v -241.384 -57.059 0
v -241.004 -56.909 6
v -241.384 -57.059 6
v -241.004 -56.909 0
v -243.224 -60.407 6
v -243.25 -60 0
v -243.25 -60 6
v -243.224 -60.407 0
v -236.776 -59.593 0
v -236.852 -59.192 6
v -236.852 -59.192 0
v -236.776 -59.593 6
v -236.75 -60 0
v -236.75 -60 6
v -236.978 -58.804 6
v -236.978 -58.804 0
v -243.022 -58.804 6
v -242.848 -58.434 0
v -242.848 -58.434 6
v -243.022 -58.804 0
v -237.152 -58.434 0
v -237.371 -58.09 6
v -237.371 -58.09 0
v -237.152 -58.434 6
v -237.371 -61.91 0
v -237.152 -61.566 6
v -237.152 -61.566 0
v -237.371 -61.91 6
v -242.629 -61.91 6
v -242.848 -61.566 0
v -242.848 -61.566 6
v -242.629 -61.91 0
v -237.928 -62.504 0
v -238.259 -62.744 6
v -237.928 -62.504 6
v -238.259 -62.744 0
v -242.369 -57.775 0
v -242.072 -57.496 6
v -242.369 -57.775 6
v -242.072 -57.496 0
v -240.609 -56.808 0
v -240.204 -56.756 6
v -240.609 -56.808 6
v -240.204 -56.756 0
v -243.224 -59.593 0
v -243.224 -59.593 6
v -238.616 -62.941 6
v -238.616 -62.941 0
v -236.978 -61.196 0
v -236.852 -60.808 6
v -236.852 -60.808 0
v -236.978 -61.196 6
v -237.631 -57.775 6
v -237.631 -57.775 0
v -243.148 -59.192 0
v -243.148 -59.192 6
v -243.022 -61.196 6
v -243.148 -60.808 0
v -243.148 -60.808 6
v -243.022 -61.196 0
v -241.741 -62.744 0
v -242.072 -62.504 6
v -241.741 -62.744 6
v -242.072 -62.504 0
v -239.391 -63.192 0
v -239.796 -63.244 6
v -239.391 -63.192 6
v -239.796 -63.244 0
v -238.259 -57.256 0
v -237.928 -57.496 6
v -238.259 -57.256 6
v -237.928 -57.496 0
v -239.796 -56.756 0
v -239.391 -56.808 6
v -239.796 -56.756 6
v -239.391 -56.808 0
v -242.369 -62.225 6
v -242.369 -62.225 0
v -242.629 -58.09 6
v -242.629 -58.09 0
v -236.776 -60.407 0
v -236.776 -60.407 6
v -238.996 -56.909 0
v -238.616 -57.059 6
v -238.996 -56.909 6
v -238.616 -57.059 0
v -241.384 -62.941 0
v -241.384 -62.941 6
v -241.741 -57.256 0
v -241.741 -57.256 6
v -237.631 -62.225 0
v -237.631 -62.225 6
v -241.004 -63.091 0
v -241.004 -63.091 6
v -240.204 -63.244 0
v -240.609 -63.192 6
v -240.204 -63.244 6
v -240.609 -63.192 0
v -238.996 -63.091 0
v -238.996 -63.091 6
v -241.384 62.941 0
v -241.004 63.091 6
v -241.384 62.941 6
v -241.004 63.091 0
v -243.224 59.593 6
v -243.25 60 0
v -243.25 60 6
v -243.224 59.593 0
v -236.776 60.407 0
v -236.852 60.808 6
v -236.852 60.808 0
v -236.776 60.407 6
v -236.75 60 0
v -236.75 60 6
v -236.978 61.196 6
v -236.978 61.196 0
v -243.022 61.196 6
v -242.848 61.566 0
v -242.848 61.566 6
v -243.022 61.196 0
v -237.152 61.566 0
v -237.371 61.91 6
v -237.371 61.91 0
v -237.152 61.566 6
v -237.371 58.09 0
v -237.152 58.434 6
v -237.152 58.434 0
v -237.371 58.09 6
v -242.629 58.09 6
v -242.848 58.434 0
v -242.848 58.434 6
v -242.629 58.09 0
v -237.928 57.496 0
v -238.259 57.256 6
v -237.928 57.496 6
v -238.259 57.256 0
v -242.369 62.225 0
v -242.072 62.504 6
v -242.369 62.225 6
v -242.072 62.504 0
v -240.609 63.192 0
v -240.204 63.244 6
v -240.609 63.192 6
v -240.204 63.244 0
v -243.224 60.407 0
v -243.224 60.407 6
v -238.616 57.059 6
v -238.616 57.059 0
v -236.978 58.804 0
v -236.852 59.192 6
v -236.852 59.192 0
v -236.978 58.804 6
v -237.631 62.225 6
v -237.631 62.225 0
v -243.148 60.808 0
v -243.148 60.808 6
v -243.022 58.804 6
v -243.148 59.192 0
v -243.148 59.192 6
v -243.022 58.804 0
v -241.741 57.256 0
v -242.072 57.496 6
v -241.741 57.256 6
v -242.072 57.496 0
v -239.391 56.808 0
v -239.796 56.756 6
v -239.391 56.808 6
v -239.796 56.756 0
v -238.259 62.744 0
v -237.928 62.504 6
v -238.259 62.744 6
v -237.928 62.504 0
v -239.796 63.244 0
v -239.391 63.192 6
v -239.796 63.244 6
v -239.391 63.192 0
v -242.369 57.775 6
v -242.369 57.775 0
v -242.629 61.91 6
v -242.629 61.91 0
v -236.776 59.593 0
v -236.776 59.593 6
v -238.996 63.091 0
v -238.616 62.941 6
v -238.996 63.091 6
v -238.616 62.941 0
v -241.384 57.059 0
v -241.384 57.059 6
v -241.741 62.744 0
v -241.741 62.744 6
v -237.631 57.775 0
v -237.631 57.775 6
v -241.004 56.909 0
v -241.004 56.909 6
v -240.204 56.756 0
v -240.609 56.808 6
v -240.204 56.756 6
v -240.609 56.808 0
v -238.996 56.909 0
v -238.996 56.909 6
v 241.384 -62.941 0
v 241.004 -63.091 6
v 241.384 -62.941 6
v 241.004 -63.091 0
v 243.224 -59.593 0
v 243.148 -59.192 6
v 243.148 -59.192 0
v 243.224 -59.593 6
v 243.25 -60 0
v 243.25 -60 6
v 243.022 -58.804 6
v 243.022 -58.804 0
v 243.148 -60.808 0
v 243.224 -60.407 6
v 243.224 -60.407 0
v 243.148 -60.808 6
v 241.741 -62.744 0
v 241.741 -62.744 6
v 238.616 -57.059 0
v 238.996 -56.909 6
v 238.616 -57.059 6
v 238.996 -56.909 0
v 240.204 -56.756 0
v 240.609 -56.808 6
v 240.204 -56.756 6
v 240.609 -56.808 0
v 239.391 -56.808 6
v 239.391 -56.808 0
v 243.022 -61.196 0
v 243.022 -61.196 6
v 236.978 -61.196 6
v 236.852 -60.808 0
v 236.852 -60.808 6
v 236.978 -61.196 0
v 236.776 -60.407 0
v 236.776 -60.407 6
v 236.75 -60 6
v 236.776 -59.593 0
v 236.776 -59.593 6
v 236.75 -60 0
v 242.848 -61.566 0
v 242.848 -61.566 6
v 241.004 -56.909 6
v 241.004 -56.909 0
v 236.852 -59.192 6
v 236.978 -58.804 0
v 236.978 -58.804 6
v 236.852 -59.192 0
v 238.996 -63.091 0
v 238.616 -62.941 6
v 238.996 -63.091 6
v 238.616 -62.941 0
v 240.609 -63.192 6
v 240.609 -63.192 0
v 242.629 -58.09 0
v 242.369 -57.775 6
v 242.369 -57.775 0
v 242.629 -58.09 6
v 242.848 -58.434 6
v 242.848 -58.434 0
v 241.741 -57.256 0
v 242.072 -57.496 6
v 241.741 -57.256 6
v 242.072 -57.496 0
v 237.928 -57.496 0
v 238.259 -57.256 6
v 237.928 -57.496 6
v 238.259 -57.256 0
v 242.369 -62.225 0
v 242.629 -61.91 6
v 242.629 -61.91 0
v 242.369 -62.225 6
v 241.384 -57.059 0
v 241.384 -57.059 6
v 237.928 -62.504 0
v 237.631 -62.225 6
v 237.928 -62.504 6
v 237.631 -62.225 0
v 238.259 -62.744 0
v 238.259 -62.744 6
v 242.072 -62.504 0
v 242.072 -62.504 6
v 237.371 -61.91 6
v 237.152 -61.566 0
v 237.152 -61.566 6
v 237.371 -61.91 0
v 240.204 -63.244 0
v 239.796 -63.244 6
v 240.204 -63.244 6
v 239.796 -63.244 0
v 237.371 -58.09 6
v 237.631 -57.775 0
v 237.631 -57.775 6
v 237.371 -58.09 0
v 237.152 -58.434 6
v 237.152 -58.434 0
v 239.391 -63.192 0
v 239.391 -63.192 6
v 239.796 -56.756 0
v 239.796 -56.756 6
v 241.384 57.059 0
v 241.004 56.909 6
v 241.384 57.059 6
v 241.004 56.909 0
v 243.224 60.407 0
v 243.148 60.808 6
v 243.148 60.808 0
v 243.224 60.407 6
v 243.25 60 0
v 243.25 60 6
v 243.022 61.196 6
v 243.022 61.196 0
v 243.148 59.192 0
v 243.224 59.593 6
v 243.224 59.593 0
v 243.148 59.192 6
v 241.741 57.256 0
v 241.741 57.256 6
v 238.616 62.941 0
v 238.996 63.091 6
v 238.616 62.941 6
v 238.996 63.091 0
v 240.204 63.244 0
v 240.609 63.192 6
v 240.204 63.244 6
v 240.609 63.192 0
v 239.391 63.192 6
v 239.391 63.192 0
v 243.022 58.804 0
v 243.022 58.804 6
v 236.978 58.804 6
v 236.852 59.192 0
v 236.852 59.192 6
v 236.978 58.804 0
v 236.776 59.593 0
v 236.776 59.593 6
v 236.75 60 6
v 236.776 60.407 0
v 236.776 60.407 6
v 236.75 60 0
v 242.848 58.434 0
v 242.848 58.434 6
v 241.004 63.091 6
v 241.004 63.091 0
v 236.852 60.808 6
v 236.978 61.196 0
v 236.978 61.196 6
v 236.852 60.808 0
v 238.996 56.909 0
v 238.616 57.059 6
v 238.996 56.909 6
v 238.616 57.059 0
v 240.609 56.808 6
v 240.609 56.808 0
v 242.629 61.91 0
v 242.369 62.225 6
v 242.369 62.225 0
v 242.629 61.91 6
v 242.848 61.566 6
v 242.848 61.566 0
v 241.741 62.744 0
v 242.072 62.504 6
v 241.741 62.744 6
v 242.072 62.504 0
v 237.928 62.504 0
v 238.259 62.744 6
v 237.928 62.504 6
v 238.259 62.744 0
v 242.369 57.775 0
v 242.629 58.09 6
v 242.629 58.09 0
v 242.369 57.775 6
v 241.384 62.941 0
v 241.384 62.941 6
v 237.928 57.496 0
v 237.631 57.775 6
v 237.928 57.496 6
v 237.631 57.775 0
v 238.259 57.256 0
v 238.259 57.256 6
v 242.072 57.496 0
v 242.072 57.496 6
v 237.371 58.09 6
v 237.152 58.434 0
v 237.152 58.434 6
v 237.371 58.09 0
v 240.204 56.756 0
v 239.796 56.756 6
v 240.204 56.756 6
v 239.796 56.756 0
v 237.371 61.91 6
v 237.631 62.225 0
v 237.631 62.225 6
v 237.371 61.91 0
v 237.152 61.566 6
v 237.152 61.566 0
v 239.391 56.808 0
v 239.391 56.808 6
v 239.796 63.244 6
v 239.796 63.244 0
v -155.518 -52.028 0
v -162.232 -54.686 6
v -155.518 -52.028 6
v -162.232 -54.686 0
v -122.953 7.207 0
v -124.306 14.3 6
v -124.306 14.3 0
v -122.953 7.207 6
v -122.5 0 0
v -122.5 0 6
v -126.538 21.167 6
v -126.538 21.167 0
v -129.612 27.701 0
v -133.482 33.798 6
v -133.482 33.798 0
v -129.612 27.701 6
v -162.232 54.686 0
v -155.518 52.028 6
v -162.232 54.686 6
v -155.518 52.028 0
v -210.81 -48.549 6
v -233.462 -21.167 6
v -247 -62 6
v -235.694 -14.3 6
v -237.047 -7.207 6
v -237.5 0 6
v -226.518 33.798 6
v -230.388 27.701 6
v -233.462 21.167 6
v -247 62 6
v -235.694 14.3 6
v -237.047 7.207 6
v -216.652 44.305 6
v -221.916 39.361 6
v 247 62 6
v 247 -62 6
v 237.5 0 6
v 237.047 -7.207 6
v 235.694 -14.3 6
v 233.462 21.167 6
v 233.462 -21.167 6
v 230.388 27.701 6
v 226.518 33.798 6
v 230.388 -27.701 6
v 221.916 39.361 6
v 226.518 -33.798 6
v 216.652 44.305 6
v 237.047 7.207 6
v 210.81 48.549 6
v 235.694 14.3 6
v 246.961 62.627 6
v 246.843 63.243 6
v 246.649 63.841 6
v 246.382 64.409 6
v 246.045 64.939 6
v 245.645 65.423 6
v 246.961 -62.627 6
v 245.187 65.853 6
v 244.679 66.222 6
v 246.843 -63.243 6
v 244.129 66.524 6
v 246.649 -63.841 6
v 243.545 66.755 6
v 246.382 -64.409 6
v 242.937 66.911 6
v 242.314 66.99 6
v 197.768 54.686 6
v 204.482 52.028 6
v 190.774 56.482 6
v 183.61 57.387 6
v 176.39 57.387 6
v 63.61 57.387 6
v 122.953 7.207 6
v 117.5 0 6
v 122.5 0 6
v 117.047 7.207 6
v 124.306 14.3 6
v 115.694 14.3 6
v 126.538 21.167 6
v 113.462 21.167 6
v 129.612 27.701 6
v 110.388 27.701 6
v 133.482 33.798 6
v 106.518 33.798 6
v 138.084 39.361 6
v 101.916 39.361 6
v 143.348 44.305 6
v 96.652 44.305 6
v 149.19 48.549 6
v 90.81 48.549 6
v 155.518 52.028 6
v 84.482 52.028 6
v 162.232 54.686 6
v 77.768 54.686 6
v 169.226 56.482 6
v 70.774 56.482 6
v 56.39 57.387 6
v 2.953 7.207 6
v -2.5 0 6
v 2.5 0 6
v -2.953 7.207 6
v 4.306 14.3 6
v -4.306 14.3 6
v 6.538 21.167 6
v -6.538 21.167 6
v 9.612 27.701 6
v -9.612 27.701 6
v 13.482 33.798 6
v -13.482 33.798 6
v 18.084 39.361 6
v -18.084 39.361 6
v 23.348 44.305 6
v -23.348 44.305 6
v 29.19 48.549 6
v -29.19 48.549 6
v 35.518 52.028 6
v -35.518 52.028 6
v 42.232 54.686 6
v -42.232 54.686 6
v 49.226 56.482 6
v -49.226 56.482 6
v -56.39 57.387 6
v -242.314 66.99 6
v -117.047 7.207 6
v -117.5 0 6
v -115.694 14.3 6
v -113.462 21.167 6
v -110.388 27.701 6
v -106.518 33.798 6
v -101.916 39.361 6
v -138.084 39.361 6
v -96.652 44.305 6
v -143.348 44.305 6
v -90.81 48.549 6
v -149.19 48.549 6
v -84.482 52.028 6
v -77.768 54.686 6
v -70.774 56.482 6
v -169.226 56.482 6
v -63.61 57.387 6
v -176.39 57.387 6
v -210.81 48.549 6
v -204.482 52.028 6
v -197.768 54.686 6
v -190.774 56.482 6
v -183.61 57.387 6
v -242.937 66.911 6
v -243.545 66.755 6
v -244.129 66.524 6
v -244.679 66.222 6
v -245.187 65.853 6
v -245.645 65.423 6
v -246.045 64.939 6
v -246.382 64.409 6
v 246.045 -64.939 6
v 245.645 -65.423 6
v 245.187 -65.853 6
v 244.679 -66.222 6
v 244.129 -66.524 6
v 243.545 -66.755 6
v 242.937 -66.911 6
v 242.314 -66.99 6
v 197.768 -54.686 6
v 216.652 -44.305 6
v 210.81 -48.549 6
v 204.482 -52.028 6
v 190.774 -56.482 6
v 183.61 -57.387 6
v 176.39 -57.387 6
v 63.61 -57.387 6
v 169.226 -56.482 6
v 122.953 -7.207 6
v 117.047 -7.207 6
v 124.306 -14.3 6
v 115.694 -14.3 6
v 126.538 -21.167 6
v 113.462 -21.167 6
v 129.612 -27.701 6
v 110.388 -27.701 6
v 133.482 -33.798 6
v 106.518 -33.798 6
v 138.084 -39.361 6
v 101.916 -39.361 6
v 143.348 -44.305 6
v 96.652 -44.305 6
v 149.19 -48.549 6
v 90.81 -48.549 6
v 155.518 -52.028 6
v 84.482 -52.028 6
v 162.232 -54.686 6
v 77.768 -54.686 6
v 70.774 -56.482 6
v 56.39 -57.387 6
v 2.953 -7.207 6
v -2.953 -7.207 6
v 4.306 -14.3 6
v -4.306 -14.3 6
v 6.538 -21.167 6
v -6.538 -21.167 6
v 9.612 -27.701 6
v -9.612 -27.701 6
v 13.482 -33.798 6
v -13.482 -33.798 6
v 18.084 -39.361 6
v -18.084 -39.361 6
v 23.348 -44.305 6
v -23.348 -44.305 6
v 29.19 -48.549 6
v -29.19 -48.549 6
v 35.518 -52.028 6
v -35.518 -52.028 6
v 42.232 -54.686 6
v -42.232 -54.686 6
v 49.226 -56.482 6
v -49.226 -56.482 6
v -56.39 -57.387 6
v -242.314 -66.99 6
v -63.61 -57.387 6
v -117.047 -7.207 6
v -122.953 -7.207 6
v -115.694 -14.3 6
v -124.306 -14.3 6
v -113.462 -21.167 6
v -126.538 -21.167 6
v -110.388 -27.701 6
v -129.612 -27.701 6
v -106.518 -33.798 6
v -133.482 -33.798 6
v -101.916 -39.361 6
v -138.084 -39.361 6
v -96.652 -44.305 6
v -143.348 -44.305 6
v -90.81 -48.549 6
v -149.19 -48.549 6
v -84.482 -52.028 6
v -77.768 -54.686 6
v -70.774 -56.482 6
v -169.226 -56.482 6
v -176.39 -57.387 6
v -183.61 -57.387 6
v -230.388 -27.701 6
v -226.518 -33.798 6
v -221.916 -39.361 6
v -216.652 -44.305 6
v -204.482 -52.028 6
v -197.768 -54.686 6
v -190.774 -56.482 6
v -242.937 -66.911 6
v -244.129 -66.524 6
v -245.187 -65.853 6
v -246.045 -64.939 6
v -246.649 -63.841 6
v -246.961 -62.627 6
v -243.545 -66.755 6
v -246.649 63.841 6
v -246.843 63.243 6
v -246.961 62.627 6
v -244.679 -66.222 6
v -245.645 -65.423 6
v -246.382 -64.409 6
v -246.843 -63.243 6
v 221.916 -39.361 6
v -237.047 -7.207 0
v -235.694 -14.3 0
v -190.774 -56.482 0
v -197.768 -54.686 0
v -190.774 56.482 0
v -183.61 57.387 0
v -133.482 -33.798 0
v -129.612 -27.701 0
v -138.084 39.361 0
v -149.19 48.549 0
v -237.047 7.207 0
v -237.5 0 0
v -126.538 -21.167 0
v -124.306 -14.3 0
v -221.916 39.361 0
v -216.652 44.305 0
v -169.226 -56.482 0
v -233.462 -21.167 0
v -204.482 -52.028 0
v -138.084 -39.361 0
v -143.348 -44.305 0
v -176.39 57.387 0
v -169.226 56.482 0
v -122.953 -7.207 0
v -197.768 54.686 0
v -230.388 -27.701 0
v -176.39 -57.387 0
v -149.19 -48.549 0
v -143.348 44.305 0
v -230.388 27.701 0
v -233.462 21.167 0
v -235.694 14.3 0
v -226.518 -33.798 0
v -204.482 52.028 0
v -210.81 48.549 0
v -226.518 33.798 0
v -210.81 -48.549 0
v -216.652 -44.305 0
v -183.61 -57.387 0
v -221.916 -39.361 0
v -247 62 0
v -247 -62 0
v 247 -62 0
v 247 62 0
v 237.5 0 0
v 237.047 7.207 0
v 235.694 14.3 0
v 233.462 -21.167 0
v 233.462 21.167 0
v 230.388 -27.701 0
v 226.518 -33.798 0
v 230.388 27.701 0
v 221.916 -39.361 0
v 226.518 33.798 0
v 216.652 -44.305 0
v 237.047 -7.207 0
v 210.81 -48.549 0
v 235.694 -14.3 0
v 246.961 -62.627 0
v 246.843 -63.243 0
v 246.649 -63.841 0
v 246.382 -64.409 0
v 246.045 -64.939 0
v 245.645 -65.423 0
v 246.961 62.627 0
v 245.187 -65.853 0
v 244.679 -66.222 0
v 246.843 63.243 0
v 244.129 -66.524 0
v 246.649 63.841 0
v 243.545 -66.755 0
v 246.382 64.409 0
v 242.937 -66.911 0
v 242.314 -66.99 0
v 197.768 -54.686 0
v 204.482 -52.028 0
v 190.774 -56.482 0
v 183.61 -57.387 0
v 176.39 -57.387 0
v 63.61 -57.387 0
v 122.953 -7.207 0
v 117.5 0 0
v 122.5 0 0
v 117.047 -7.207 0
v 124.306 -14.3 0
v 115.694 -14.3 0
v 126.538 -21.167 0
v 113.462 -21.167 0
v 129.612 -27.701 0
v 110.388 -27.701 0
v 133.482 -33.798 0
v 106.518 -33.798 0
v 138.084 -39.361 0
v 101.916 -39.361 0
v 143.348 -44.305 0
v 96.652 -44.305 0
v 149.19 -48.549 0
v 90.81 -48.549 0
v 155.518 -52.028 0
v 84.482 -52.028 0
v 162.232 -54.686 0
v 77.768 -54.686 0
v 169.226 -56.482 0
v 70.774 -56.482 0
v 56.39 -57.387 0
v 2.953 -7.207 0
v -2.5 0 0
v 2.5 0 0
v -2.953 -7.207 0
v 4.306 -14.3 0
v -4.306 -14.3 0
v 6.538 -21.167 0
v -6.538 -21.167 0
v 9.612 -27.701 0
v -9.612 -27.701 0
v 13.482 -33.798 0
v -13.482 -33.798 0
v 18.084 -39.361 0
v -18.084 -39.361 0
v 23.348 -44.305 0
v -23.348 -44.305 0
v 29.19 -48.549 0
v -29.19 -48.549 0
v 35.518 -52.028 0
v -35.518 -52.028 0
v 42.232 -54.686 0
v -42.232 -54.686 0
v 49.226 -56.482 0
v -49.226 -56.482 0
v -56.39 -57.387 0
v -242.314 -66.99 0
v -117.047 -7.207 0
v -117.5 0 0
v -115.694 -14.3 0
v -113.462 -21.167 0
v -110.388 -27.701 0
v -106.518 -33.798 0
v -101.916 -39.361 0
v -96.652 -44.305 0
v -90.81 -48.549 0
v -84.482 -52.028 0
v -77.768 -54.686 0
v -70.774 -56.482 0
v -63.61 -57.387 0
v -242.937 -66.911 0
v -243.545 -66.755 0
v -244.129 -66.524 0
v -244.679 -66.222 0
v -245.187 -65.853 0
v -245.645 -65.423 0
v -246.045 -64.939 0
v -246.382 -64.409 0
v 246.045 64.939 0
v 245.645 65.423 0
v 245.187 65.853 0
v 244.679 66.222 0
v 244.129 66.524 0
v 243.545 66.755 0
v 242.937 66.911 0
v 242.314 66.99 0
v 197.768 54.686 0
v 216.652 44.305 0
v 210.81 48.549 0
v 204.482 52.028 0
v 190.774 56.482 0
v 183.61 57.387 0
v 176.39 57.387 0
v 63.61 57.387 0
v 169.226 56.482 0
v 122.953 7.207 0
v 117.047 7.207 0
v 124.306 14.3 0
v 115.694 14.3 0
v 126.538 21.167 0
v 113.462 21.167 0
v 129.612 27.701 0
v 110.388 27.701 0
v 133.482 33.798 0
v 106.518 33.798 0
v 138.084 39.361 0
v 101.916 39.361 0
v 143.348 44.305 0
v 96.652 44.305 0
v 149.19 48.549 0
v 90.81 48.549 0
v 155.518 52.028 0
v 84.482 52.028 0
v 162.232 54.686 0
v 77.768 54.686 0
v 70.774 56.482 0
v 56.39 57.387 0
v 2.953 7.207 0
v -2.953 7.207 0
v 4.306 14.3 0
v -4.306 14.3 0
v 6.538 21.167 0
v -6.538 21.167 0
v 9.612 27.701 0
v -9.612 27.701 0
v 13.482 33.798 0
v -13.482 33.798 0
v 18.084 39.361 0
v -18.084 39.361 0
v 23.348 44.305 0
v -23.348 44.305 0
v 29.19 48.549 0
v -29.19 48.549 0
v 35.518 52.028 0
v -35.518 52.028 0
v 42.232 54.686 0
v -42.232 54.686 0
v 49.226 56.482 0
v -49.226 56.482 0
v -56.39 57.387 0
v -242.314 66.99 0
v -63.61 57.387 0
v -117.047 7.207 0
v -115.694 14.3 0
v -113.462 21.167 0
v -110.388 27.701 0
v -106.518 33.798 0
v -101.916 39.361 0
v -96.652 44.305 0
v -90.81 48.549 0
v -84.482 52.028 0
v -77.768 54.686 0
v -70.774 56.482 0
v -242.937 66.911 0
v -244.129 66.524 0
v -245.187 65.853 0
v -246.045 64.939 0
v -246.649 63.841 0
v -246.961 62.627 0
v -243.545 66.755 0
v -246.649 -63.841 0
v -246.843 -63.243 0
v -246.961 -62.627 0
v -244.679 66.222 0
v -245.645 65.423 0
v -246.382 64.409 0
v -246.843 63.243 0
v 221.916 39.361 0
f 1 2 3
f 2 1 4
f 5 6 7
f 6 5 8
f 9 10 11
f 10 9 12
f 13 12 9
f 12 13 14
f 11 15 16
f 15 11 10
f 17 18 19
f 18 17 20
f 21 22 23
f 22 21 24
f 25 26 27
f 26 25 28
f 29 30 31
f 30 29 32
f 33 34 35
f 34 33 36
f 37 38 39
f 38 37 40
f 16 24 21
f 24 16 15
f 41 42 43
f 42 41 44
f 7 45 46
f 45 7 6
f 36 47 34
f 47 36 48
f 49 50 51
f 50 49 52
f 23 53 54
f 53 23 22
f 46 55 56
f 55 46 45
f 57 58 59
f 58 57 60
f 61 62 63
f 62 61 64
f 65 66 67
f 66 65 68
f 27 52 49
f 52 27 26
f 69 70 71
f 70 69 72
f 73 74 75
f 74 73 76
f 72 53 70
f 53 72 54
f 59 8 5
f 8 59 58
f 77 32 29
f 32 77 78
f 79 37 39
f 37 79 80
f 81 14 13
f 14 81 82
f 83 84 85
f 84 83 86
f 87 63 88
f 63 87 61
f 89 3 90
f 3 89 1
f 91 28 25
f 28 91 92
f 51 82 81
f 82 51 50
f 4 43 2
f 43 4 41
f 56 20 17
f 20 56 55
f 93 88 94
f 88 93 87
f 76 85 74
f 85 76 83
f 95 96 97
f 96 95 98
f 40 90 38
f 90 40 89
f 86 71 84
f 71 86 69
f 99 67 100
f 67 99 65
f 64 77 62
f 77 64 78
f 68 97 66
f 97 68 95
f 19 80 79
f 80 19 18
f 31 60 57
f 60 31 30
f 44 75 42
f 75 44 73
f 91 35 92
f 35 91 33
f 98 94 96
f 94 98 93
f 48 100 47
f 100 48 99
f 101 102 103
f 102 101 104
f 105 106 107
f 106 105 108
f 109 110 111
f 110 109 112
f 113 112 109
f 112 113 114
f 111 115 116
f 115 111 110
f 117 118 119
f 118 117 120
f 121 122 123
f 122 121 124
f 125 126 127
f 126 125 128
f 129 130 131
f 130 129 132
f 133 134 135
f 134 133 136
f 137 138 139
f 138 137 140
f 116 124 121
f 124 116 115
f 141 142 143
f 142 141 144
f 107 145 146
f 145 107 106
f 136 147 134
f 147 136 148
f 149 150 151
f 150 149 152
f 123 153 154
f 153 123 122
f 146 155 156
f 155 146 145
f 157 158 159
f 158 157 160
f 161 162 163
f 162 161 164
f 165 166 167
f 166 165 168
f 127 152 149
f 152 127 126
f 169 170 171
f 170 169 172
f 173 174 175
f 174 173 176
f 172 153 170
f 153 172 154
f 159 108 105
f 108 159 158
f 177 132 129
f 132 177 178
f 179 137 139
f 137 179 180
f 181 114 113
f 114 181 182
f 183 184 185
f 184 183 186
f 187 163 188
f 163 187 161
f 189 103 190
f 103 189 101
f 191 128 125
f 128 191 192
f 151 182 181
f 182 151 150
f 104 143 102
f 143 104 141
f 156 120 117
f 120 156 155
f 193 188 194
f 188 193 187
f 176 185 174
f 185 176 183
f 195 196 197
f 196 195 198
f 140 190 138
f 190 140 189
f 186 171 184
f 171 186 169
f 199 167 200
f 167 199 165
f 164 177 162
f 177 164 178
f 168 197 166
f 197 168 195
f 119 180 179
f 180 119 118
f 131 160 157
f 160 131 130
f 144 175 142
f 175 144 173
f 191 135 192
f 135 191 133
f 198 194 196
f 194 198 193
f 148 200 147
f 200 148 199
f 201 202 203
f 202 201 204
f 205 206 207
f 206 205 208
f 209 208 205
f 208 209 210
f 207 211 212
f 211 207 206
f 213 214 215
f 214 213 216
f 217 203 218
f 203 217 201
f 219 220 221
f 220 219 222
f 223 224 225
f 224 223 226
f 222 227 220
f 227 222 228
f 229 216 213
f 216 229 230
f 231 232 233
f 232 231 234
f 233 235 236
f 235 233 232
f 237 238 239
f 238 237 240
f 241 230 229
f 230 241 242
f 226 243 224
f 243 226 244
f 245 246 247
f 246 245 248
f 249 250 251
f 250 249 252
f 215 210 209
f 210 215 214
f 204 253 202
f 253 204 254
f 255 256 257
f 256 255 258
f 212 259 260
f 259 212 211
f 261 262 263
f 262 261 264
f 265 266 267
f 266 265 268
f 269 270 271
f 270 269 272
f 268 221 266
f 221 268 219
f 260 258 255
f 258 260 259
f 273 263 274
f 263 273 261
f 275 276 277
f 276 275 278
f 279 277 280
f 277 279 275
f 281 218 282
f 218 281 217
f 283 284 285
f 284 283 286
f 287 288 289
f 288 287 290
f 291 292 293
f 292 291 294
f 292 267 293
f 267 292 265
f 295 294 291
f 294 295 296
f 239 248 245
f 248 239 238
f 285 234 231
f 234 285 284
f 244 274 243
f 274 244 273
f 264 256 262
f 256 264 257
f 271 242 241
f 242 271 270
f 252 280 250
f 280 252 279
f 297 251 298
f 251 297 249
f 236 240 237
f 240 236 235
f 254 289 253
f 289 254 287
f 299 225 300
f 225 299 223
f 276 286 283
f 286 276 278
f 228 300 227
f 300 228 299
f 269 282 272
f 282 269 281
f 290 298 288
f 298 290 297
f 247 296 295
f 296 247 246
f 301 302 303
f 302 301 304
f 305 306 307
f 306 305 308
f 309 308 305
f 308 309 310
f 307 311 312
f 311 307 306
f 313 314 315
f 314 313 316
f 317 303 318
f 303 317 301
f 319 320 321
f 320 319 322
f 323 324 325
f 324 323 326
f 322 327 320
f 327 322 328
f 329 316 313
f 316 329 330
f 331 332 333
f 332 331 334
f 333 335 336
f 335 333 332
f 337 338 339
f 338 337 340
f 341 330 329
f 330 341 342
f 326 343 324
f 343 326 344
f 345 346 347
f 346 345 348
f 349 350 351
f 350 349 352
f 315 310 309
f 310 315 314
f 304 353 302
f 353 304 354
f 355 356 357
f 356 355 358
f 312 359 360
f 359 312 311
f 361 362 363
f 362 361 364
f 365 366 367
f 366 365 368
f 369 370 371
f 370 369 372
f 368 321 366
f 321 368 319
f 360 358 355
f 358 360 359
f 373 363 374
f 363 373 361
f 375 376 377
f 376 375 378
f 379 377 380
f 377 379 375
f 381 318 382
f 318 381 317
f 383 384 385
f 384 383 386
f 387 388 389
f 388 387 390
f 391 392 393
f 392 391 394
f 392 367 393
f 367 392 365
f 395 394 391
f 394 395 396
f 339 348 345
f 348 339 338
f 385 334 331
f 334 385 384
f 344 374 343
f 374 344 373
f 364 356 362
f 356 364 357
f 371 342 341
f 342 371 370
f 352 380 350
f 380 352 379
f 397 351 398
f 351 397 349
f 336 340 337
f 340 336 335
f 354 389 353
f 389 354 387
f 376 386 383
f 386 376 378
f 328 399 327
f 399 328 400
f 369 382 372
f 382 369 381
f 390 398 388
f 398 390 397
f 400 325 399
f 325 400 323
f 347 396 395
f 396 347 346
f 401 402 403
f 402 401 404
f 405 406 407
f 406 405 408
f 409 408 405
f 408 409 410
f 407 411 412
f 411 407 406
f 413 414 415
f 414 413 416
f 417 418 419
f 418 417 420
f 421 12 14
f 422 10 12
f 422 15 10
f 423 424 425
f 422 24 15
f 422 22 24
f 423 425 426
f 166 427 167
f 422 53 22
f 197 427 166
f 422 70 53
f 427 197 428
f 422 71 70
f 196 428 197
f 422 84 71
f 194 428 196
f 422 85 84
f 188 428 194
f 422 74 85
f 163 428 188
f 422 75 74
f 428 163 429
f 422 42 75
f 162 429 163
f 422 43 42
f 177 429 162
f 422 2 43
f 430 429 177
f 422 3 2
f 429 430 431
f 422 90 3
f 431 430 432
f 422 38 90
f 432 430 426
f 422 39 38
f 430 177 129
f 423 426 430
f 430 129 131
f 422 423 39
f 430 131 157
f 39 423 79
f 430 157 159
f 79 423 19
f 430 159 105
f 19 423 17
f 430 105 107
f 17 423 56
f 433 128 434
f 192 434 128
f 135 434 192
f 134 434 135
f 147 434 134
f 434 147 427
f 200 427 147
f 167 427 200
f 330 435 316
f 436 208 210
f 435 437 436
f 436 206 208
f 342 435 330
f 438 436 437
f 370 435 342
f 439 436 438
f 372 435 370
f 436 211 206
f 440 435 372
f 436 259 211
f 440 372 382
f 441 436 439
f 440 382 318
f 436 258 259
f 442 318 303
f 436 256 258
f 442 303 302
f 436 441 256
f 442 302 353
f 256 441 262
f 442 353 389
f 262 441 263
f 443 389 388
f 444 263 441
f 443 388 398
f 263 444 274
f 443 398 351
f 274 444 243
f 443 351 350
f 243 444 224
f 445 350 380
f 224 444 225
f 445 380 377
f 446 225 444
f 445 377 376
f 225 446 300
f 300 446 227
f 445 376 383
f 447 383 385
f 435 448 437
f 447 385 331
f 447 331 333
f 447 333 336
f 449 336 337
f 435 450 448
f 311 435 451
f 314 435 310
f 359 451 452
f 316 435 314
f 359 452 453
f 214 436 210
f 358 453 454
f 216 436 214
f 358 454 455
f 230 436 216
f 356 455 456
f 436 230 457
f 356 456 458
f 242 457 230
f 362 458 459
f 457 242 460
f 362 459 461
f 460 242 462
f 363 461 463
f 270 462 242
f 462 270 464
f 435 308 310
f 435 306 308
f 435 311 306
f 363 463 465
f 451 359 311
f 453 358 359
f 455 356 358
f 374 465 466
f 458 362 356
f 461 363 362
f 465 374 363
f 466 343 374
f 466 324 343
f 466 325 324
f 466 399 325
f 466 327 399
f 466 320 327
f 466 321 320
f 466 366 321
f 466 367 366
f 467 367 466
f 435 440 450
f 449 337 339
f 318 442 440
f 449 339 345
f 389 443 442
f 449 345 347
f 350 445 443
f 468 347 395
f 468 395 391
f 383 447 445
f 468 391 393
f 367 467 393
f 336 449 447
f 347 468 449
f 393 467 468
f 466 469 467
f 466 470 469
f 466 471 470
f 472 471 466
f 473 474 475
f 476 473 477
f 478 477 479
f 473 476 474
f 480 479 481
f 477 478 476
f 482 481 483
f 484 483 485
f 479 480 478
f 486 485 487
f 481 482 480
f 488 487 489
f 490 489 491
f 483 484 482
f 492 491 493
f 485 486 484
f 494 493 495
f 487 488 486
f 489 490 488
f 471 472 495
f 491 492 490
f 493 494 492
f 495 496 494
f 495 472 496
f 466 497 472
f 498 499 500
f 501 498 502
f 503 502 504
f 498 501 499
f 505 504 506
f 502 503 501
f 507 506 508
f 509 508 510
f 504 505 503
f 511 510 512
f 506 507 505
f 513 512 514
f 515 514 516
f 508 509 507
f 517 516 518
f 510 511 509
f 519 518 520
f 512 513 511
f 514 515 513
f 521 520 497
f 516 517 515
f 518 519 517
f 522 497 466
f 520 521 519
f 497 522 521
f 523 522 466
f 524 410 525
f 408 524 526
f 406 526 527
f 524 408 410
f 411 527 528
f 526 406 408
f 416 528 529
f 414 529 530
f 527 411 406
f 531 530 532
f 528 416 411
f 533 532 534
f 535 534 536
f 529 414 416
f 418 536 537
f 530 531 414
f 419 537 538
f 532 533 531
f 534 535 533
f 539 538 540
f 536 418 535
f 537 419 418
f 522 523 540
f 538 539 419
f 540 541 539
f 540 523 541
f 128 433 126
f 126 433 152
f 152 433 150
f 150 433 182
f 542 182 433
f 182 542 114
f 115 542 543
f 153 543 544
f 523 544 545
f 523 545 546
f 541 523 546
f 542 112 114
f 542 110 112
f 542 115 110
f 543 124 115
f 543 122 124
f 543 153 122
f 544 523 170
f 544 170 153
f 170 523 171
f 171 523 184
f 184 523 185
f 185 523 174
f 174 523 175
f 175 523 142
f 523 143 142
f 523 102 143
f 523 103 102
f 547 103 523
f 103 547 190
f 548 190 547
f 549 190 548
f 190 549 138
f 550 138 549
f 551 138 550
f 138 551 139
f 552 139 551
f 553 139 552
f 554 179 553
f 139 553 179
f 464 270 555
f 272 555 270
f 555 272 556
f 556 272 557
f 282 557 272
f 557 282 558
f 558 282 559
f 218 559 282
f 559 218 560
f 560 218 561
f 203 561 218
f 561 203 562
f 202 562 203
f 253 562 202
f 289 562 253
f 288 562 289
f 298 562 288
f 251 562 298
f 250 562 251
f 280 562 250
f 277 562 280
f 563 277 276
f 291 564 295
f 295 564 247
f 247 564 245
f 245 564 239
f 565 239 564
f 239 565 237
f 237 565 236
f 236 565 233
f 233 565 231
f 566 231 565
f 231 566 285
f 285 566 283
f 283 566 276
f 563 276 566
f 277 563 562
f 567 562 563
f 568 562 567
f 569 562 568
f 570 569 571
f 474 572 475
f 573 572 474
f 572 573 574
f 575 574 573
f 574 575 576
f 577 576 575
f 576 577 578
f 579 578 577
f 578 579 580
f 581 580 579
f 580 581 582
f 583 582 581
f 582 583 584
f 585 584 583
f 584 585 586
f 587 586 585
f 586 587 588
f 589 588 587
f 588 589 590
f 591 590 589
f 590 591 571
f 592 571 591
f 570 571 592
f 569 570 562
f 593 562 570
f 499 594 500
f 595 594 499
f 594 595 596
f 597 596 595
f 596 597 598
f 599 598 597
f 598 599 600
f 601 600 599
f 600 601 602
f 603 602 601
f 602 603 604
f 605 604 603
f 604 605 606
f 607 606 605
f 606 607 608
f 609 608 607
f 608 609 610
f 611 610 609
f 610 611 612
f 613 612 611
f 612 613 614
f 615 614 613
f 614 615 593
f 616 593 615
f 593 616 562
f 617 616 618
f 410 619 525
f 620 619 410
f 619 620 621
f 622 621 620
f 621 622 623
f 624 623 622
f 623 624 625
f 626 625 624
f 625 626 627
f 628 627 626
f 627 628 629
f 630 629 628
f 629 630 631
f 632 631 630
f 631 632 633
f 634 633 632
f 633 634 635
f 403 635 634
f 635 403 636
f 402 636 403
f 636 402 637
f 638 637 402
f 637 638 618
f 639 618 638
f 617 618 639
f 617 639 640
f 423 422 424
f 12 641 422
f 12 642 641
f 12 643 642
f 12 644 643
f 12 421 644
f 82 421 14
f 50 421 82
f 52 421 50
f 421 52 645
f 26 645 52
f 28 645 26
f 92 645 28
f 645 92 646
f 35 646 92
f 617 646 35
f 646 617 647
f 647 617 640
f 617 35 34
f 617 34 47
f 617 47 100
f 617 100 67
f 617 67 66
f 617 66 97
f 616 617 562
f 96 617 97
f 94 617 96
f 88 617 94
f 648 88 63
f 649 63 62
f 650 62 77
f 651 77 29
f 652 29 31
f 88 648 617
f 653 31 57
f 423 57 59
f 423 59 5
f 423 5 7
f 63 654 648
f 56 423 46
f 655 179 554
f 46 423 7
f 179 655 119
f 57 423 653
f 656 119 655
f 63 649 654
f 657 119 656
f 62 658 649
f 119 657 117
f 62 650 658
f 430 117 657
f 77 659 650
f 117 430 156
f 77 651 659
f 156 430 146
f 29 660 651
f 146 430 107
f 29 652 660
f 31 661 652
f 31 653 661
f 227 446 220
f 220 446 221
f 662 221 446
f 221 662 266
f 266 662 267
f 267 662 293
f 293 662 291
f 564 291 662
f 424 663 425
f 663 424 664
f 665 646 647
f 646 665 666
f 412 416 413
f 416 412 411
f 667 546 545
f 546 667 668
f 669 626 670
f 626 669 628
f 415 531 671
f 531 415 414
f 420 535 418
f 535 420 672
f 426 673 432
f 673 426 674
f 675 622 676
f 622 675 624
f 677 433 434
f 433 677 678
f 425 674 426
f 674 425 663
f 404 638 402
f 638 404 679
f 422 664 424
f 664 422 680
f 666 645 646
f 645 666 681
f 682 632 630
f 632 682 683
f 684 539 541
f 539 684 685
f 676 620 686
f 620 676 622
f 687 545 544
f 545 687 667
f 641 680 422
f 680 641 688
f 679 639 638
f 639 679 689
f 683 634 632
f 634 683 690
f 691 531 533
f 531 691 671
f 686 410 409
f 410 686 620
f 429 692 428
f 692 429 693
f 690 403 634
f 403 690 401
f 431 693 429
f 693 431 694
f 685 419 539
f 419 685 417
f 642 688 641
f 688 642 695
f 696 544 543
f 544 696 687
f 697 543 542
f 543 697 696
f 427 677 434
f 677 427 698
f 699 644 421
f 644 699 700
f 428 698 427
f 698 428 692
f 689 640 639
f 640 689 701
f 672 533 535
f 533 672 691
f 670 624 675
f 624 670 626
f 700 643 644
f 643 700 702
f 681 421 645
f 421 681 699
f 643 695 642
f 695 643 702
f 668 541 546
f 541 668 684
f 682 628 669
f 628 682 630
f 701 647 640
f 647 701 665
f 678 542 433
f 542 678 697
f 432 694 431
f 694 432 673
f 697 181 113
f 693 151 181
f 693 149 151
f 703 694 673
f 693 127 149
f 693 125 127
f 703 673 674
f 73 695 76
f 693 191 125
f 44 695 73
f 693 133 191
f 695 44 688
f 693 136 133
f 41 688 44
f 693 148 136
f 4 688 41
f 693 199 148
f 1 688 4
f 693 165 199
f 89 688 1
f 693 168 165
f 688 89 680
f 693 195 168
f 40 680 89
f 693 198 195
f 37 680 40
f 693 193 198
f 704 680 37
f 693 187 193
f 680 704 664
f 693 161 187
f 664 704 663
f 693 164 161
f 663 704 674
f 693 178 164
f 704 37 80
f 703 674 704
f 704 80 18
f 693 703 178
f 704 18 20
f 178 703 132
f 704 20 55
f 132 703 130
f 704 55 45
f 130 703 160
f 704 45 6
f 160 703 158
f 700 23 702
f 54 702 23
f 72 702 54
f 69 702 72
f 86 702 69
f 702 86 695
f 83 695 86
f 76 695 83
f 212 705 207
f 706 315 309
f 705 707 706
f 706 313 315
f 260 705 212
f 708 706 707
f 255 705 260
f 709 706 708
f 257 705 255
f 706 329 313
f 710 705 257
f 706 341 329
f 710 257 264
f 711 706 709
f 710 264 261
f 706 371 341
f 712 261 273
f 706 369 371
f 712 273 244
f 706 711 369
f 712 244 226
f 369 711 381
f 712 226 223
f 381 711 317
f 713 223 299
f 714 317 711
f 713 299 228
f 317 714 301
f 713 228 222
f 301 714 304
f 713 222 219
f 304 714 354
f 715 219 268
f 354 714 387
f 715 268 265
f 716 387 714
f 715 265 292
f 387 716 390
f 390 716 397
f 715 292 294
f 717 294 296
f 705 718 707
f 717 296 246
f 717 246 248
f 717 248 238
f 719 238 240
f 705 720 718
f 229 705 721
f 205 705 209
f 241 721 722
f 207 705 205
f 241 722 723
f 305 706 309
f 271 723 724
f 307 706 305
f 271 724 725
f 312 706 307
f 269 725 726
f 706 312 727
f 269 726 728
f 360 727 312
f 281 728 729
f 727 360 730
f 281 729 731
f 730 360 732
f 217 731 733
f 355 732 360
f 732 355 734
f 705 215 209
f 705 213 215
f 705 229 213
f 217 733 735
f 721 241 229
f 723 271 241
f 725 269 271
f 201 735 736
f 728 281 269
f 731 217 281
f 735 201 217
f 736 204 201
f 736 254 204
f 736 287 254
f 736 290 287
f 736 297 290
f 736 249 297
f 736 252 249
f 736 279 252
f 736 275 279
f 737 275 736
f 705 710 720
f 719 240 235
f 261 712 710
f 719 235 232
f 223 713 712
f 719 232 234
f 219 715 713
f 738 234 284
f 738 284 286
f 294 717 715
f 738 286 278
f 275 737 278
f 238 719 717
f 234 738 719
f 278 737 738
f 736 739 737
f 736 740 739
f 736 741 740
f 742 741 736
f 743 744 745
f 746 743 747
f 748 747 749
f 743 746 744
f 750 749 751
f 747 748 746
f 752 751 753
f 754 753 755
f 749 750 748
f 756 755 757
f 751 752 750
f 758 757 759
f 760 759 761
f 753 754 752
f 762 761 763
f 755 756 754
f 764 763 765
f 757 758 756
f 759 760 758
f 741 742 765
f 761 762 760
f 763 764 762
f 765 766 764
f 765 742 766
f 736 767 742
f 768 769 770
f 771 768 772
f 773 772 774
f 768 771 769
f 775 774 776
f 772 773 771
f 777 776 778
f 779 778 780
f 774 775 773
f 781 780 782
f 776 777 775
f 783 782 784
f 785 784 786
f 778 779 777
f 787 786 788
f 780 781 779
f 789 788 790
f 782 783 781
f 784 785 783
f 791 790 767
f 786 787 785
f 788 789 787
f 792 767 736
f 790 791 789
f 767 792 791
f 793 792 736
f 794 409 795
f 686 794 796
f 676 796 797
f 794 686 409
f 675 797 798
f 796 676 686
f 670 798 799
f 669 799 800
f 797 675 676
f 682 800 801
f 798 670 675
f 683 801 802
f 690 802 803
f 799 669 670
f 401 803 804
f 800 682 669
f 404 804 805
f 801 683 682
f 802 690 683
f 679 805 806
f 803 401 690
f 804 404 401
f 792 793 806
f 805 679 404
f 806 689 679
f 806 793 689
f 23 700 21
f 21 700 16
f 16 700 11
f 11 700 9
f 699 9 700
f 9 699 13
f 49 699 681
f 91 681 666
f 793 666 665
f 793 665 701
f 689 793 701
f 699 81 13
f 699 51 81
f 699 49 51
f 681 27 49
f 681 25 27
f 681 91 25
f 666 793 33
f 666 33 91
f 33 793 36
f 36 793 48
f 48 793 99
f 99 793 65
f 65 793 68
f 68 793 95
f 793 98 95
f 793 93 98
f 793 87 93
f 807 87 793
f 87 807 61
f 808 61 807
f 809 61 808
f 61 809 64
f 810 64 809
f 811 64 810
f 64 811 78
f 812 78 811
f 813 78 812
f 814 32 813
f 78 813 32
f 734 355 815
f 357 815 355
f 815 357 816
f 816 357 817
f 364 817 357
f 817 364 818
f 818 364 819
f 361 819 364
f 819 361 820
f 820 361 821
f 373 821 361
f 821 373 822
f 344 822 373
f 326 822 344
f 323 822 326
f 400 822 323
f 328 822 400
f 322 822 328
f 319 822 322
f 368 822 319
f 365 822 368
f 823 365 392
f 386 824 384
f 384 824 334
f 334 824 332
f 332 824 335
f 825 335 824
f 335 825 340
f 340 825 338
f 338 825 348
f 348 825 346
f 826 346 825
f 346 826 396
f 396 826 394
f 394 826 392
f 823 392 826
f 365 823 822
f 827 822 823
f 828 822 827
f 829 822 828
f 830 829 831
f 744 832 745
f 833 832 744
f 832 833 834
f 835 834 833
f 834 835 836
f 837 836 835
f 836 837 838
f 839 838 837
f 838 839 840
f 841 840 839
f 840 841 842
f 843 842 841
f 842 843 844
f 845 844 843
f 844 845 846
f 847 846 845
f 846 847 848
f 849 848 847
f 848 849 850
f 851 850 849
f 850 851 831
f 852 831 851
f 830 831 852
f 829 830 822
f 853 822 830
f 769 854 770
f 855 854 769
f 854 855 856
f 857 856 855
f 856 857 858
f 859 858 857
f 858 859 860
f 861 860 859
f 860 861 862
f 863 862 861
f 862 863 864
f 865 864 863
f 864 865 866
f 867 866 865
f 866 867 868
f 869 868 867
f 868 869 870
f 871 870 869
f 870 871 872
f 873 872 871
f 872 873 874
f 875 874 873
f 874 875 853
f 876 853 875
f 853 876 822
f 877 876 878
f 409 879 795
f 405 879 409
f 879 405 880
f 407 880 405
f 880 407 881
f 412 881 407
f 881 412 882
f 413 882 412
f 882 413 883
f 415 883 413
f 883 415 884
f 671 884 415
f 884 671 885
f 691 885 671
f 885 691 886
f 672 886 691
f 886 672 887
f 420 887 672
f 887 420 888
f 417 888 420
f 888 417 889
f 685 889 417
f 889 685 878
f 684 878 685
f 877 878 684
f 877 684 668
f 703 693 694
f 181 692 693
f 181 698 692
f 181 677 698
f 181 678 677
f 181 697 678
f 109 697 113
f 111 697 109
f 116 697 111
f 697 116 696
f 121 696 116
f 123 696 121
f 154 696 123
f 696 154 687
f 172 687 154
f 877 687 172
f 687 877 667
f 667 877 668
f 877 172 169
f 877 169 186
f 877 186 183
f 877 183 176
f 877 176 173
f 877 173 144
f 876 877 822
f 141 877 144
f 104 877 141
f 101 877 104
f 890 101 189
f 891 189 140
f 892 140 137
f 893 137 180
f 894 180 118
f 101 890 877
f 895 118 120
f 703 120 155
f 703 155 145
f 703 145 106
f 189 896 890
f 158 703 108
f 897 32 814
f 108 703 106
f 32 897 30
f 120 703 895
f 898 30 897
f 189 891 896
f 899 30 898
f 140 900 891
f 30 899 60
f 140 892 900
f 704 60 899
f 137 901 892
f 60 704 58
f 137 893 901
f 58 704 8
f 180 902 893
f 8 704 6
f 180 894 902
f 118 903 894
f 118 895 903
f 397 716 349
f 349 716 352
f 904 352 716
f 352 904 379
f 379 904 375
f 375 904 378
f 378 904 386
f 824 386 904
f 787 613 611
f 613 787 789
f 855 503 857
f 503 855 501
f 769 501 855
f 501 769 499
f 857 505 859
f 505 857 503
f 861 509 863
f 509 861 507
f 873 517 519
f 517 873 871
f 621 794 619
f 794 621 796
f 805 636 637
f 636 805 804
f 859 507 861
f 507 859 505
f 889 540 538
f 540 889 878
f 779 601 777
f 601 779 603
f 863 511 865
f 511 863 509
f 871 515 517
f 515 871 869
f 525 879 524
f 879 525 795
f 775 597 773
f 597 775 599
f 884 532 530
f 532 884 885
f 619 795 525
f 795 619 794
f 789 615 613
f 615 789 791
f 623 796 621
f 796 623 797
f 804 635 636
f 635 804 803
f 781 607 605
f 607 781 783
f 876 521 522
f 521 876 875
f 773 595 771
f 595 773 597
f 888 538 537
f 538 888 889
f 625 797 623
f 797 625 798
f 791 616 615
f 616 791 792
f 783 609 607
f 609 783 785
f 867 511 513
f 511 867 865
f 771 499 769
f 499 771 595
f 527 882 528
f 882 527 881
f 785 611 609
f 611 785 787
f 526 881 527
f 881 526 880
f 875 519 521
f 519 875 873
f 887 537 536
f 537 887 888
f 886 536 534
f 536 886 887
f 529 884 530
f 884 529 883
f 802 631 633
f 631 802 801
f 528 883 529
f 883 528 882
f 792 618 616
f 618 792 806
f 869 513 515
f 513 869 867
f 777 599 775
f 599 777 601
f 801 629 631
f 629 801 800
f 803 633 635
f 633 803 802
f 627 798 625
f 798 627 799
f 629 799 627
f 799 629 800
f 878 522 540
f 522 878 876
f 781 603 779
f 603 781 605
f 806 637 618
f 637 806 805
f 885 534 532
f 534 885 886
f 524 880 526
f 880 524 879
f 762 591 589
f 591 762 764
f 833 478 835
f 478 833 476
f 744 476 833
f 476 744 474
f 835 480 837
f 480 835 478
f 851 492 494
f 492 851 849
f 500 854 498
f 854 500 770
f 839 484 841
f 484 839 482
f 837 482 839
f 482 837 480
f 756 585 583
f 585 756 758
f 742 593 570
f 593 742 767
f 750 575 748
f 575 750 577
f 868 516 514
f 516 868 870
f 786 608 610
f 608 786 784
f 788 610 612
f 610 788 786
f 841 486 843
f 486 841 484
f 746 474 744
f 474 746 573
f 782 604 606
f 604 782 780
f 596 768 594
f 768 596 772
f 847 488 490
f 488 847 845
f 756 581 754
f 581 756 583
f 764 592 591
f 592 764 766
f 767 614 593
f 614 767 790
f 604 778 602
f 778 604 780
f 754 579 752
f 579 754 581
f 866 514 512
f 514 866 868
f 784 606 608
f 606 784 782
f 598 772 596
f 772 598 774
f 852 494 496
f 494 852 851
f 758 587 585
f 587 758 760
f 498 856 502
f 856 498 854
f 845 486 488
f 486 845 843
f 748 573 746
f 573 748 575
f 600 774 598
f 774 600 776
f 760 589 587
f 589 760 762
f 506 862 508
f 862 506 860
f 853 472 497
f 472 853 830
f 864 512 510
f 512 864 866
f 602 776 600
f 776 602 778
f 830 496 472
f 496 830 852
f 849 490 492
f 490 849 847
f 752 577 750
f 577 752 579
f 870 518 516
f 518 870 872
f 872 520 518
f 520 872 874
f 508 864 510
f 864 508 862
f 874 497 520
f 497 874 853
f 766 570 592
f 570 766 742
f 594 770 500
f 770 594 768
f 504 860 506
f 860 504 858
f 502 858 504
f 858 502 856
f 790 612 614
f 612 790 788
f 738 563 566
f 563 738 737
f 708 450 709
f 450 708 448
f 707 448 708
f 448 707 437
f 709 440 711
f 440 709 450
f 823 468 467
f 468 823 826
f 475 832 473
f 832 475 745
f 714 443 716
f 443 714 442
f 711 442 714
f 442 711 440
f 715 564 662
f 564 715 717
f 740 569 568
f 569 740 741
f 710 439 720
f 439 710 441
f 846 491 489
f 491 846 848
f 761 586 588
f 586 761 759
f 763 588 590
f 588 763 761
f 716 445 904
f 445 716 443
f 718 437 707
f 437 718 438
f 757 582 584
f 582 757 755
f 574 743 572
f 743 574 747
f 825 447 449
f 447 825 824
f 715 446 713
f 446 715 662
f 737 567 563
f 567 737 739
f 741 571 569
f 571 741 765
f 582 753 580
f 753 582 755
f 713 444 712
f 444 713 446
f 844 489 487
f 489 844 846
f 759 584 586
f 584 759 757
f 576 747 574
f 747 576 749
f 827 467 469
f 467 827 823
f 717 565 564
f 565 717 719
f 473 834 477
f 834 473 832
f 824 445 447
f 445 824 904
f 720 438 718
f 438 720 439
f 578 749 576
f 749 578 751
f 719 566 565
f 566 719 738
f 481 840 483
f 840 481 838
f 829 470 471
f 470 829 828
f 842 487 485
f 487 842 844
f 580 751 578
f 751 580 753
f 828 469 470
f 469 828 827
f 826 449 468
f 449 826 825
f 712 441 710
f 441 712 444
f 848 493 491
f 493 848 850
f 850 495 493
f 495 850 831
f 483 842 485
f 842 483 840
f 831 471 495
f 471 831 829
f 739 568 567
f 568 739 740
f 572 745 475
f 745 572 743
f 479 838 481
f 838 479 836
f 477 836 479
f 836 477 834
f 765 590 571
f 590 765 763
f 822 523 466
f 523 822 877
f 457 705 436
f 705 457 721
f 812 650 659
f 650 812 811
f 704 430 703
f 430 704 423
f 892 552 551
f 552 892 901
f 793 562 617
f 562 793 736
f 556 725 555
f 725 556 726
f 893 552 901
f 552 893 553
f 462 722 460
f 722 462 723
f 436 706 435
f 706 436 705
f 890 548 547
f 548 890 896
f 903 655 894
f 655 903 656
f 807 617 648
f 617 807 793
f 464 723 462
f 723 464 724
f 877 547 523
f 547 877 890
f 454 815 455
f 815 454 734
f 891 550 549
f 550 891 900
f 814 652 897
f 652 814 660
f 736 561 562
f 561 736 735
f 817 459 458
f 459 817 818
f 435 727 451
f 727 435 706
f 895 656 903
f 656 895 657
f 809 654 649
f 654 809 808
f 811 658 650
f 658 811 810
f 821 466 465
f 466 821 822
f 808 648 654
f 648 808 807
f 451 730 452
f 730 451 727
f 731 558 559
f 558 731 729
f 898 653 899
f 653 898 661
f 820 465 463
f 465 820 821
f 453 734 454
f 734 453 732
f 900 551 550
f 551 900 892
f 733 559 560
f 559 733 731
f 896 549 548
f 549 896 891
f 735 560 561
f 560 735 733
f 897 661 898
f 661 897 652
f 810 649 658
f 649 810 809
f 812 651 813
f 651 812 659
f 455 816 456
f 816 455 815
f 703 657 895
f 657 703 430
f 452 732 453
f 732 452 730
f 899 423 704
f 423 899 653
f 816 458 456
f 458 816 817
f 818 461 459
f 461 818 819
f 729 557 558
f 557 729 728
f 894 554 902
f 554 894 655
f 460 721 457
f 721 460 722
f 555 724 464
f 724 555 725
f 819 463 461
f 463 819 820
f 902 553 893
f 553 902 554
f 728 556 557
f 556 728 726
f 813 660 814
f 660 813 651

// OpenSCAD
$fn = 50;

difference() {
	union() {
		hull() {
			translate(v = [-242.0, 62.0, 0]) {
				cylinder(h = 6, r = 5);
			}
			translate(v = [242.0, 62.0, 0]) {
				cylinder(h = 6, r = 5);
			}
			translate(v = [-242.0, -62.0, 0]) {
				cylinder(h = 6, r = 5);
			}
			translate(v = [242.0, -62.0, 0]) {
				cylinder(h = 6, r = 5);
			}
		}
	}
	union() {
		translate(v = [-240.0, -60.0, -100.0]) {
			cylinder(h = 200, r = 3.25);
		}
		translate(v = [-240.0, 60.0, -100.0]) {
			cylinder(h = 200, r = 3.25);
		}
		translate(v = [240.0, -60.0, -100.0]) {
			cylinder(h = 200, r = 3.25);
		}
		translate(v = [240.0, 60.0, -100.0]) {
			cylinder(h = 200, r = 3.25);
		}
		translate(v = [-240.0, -60.0, -100.0]) {
			cylinder(h = 200, r = 1.8);
		}
		translate(v = [-240.0, 60.0, -100.0]) {
			cylinder(h = 200, r = 1.8);
		}
		translate(v = [240.0, -60.0, -100.0]) {
			cylinder(h = 200, r = 1.8);
		}
		translate(v = [240.0, 60.0, -100.0]) {
			cylinder(h = 200, r = 1.8);
		}
		translate(v = [-180.0, 0, 0.0]) {
			cylinder(h = 6, r = 57.5);
		}
		translate(v = [-60.0, 0, 0.0]) {
			cylinder(h = 6, r = 57.5);
		}
		translate(v = [60.0, 0, 0.0]) {
			cylinder(h = 6, r = 57.5);
		}
		translate(v = [180.0, 0, 0.0]) {
			cylinder(h = 6, r = 57.5);
		}
	}
}
